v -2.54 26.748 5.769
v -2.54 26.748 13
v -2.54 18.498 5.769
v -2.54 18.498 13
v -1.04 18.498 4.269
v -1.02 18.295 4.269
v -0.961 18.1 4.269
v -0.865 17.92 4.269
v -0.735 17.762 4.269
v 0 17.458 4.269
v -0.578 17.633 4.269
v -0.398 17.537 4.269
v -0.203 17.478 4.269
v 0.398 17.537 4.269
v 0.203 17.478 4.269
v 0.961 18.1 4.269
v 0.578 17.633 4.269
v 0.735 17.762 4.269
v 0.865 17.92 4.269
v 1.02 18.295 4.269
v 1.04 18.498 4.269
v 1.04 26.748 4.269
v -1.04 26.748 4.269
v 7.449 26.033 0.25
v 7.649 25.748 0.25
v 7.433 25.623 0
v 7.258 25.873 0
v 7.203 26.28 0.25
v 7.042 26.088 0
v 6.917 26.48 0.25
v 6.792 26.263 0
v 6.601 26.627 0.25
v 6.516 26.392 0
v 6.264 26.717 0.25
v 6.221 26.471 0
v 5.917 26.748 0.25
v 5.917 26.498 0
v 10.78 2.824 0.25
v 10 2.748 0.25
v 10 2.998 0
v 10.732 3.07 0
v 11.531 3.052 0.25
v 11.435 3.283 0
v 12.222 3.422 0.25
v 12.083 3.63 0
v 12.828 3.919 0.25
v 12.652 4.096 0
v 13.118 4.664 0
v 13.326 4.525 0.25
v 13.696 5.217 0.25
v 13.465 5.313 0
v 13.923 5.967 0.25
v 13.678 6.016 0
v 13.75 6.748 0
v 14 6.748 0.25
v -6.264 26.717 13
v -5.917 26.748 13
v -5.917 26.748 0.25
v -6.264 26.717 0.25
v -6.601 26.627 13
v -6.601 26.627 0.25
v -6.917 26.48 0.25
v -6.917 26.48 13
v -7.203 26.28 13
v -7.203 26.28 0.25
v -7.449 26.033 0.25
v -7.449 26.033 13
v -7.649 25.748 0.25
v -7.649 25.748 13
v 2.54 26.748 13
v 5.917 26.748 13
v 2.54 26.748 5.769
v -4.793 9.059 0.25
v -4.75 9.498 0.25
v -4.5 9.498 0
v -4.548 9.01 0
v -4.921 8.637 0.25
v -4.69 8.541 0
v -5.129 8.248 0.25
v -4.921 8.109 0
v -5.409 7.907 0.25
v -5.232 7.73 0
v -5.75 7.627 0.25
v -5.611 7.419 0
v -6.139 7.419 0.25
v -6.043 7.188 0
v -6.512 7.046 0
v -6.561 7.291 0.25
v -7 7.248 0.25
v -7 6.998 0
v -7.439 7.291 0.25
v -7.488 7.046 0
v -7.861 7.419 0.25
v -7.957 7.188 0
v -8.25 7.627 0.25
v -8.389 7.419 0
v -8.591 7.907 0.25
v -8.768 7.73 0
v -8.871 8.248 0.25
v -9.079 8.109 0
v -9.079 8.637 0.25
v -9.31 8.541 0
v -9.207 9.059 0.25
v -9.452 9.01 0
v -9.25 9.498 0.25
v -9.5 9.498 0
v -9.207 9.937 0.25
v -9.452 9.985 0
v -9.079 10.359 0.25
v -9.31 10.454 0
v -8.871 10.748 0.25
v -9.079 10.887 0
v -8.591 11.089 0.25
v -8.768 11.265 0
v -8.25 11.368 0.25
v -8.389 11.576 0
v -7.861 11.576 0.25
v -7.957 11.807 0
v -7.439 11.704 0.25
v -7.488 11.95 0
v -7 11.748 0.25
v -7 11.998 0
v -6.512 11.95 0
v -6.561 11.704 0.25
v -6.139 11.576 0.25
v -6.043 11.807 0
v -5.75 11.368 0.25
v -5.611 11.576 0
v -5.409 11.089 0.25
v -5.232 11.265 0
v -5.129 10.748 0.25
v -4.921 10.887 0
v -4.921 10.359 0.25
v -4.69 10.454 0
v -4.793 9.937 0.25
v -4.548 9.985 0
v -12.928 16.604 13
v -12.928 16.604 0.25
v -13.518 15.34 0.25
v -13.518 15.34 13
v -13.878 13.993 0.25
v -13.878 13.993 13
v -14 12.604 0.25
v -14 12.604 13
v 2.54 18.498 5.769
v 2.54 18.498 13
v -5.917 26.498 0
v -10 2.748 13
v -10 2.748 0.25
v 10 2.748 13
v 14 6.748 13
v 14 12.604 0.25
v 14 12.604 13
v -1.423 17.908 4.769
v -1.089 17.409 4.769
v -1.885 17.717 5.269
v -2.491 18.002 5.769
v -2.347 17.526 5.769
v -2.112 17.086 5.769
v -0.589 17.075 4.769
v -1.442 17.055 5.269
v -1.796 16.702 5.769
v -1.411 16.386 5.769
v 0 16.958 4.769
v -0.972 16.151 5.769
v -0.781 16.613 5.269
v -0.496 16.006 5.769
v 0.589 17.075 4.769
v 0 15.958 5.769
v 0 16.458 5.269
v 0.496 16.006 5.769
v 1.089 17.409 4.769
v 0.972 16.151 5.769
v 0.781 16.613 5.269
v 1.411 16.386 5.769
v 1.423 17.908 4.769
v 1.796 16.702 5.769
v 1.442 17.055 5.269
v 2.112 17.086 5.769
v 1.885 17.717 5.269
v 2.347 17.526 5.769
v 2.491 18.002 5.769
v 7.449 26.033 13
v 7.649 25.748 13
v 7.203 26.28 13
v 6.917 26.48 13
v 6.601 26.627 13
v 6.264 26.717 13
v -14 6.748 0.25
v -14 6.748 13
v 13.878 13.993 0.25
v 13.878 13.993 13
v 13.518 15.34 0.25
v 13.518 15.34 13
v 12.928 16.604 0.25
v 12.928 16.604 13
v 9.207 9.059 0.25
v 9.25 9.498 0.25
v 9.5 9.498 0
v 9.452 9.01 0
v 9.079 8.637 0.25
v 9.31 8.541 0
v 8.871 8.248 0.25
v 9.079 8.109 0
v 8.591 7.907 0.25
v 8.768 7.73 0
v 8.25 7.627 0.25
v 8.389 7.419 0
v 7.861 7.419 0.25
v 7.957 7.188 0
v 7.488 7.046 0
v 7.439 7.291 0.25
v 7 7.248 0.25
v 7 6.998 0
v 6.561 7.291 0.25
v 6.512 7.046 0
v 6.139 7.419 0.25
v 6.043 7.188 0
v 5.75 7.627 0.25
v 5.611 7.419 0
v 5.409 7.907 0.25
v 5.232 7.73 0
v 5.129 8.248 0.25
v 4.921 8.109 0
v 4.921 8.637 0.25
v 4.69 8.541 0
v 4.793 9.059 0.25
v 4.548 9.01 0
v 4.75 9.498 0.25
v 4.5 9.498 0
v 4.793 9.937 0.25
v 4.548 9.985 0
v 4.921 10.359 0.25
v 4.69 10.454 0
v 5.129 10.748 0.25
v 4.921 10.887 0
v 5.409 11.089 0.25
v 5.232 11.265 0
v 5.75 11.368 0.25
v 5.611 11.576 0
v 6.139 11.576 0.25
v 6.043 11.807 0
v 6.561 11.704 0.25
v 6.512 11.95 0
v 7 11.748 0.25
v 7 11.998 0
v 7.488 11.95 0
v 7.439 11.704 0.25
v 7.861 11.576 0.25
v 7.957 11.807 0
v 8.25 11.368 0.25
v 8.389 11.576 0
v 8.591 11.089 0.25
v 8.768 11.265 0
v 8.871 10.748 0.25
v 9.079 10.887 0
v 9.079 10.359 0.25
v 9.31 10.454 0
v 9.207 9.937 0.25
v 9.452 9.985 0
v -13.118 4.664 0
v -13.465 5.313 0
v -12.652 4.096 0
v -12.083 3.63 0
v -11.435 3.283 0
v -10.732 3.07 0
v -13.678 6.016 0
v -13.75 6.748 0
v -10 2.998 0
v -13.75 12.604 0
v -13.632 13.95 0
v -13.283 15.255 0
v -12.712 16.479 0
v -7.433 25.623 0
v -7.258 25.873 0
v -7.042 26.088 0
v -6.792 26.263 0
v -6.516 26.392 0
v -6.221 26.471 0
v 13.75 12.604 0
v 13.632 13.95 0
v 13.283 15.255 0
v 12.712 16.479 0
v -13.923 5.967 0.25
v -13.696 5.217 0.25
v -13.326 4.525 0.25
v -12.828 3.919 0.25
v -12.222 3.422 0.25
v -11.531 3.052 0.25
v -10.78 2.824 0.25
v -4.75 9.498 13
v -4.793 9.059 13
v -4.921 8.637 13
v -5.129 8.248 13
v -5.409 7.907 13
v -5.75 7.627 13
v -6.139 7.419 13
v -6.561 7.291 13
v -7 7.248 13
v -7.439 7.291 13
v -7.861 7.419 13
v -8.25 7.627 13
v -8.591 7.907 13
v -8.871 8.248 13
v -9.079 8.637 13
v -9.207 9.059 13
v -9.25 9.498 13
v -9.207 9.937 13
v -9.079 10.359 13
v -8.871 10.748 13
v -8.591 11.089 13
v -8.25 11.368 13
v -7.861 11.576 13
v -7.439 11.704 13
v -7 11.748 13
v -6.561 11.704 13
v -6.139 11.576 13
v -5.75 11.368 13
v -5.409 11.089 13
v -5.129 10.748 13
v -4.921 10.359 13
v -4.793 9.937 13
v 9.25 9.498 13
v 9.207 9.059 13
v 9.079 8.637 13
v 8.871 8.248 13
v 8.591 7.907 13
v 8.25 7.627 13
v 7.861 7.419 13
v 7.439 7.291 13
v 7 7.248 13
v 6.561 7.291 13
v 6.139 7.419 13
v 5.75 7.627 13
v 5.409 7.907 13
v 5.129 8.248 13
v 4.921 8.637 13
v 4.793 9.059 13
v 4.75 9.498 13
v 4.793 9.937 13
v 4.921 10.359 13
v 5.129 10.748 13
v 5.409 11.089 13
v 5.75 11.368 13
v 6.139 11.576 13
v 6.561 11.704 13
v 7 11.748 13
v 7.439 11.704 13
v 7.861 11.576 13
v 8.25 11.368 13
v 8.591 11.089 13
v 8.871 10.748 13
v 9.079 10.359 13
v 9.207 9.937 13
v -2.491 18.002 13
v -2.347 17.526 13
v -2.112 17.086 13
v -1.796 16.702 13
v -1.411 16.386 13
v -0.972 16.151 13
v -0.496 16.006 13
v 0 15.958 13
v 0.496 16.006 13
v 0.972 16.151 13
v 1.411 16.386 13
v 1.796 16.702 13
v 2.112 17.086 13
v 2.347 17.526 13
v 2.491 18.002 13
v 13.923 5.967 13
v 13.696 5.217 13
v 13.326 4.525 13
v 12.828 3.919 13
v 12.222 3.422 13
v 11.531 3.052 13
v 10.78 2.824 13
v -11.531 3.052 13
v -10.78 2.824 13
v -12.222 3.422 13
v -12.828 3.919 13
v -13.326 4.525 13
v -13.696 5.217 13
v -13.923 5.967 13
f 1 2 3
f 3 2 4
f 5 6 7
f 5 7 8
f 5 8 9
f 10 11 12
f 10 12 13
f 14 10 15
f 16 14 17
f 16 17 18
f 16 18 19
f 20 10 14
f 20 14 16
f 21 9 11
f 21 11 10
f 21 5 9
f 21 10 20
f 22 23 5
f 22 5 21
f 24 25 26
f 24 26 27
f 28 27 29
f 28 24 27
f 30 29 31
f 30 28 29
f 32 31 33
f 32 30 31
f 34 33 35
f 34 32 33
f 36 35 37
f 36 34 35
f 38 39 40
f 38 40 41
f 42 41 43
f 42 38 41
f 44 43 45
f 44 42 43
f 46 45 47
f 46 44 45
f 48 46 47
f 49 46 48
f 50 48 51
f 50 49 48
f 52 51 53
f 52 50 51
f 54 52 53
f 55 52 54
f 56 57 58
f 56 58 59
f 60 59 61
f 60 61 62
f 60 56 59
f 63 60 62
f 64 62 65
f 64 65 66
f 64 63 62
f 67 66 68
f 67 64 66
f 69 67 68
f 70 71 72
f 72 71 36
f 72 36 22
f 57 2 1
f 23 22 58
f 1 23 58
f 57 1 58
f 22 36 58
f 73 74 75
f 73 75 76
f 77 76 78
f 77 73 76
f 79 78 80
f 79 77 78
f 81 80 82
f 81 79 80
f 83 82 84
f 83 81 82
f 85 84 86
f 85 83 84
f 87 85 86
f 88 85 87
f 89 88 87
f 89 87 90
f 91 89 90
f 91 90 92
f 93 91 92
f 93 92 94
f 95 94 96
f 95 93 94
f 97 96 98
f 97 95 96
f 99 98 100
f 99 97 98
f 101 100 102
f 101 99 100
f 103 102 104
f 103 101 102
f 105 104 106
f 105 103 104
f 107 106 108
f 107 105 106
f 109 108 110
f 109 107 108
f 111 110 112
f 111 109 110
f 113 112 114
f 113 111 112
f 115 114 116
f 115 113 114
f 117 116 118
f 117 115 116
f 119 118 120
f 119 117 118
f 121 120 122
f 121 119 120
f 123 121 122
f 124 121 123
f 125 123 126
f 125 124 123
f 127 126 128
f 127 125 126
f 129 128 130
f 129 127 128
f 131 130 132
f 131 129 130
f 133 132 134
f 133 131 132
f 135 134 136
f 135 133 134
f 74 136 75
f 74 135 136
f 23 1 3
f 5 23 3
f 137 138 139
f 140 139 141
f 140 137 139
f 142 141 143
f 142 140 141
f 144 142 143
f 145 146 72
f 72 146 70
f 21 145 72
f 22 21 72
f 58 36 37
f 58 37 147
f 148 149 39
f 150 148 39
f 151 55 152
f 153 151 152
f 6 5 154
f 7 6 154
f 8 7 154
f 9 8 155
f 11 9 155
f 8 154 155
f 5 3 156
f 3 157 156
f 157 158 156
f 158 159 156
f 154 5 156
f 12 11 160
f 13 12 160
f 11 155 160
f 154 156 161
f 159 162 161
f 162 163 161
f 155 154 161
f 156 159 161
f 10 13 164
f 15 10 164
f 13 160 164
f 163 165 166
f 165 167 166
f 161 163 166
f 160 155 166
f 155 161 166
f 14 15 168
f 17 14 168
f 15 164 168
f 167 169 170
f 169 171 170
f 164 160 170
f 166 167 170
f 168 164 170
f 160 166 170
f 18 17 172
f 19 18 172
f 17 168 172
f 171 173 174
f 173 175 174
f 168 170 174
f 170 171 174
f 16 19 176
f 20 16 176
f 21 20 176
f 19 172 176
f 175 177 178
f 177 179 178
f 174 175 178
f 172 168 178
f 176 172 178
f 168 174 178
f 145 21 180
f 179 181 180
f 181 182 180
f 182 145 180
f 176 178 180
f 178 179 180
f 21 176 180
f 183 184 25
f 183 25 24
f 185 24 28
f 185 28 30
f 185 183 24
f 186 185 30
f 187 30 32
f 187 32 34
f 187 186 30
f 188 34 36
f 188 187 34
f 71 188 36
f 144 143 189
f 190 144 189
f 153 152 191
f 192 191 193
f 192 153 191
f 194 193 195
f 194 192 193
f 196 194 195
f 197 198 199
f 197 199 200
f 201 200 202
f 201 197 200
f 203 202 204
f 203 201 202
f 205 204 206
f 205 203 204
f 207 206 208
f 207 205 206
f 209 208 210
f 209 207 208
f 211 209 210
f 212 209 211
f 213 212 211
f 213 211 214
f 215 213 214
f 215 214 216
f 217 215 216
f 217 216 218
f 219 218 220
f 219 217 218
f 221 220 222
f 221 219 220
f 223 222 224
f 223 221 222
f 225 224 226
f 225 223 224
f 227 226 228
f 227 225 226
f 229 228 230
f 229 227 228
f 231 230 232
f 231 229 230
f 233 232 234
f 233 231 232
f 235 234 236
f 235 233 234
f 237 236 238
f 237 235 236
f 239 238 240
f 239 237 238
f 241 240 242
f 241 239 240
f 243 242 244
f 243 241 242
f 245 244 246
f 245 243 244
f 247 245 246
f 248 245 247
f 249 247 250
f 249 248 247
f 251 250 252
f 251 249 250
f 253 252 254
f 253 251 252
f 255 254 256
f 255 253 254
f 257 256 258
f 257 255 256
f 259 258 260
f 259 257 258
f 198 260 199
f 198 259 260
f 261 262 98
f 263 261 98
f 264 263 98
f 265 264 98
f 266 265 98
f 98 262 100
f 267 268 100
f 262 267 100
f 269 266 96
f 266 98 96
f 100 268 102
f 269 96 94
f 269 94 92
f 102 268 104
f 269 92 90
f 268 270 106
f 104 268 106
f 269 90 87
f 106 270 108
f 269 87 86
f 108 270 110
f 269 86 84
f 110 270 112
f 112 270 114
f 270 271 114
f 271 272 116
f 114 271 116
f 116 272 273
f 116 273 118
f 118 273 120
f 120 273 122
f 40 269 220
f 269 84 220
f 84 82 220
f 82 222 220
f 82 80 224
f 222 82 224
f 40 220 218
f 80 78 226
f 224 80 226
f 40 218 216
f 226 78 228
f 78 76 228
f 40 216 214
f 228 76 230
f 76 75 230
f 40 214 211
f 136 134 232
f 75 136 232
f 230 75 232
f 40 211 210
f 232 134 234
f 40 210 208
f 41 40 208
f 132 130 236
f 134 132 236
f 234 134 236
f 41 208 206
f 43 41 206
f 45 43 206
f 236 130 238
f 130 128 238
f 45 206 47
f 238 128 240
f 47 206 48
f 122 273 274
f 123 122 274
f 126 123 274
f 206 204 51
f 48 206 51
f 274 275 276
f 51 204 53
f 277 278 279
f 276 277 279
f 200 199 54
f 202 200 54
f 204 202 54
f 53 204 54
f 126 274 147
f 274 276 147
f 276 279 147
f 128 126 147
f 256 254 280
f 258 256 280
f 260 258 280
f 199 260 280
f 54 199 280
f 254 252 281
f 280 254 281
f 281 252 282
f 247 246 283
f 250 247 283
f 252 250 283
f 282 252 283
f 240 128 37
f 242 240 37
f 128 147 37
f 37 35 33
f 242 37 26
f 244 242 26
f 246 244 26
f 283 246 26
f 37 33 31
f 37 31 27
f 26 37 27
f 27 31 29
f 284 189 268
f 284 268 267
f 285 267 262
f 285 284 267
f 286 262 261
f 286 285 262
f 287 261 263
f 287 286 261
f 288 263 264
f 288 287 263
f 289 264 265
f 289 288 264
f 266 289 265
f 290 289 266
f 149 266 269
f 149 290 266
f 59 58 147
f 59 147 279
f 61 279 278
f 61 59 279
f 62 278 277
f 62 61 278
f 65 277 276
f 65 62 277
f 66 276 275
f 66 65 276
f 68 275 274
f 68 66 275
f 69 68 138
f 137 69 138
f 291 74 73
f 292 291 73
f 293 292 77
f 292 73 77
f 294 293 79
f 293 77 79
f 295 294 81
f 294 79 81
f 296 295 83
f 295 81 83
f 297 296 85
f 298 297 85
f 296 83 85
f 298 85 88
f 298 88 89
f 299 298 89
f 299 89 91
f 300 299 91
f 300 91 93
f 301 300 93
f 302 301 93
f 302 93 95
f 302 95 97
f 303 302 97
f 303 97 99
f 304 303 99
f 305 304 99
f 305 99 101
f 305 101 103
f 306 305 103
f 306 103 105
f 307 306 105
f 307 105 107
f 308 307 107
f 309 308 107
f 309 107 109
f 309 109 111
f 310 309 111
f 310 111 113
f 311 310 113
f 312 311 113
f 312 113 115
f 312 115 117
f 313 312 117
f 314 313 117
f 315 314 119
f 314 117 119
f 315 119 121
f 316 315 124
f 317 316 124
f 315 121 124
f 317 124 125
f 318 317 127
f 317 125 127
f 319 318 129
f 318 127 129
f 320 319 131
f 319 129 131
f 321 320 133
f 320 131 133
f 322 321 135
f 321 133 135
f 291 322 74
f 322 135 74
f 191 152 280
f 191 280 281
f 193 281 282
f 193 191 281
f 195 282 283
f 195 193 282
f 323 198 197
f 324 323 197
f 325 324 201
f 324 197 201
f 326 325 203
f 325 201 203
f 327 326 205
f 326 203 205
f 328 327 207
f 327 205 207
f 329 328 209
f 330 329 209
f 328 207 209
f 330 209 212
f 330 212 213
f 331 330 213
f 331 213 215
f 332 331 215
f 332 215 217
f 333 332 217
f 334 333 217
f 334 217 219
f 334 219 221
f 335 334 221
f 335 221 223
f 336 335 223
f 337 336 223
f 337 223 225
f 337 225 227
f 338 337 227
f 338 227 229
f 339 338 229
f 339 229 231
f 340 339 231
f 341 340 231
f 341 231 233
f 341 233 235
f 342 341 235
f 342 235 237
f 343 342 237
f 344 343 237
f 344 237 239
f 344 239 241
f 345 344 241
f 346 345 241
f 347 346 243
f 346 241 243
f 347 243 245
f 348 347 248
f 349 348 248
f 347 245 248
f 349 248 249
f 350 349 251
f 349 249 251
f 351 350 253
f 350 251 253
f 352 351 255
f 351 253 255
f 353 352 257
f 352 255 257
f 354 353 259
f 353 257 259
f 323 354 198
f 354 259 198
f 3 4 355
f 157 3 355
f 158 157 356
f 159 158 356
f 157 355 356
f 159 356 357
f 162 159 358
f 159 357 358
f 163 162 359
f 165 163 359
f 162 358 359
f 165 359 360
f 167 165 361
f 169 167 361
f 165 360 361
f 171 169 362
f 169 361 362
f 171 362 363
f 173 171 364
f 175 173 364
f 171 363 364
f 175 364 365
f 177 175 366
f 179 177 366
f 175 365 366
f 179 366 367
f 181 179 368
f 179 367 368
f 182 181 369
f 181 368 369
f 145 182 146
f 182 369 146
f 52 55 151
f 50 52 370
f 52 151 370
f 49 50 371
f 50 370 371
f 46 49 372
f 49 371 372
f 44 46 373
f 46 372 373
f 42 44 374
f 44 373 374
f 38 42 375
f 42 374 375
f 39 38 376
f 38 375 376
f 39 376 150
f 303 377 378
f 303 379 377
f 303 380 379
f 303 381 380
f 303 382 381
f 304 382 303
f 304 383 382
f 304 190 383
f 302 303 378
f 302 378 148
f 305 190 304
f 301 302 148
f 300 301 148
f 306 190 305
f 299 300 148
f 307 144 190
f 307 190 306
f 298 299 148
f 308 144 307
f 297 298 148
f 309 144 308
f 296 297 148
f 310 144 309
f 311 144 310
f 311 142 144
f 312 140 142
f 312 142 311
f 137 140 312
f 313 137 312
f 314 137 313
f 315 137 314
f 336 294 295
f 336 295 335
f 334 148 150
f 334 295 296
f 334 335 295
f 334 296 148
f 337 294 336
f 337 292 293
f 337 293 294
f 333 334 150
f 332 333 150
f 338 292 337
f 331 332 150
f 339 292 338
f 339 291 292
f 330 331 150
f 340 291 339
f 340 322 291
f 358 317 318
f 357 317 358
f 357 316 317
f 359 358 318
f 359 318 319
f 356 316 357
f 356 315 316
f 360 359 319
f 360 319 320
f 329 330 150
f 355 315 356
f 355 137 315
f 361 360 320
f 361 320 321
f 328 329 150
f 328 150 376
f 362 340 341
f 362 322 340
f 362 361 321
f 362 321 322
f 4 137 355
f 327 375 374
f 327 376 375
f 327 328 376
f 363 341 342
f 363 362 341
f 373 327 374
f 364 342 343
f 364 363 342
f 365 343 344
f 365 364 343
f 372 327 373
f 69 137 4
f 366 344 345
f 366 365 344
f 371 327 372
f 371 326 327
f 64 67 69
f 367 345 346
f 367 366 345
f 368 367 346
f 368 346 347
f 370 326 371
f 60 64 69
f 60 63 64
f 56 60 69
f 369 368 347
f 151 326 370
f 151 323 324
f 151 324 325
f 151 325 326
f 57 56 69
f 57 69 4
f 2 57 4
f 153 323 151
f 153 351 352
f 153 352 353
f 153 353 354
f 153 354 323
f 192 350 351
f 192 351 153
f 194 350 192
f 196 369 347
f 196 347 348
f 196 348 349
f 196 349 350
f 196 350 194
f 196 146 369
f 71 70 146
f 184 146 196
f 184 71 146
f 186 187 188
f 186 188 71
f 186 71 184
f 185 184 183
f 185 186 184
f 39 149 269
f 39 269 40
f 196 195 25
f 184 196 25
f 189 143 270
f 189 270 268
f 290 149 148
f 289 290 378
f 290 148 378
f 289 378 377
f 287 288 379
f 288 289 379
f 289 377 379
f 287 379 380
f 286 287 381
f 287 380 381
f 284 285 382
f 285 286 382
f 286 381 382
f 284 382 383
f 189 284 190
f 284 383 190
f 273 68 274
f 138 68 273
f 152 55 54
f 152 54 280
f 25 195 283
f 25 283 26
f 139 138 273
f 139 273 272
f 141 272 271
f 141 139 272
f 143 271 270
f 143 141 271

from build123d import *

# Parameters (mm, degrees)
F1_DEPTH = 13
F2_R     = 8
F3_R     = 2
F5_DEPTH = 8.73125
F6_R     = 2.25
F7_DEPTH = 13.001
F8_R     = 4
F9_SIZE  = 1.5
F10_SIZE = 0.25


with BuildPart() as f1:
    # F0 (on Top) → F1 (new body)
    with BuildSketch(Plane.XY):
        Polygon((0, 2.747639), (14, 2.747639), (14, 14.747639), (7.071797, 26.747639), (0, 26.747639), (-7.071797, 26.747639), (-14, 14.747639), (-14, 2.747639), align=None)
    extrude(amount=F1_DEPTH)

    # F2
    f2_edges = [f1.edges().sort_by_distance(p)[0] for p in [
        (-14, 14.747639, 6.5),
        (14, 14.747639, 6.5),
    ]]
    fillet(f2_edges, radius=F2_R)

    # F3
    f3_edges = [f1.edges().sort_by_distance(p)[0] for p in [
        (-7.071797, 26.747639, 6.5),
        (7.071797, 26.747639, 6.5),
    ]]
    fillet(f3_edges, radius=F3_R)

    # F4 (on face) → F5 (cut)
    with BuildSketch(Plane.XY.offset(13)):
        with BuildLine():
            Line((-2.54, 26.747639), (-2.54, 18.497639))
            ThreePointArc((-2.54, 18.497639), (0, 15.957639), (2.54, 18.497639))
            Line((2.54, 18.497639), (2.54, 26.747639))
            Line((2.54, 26.747639), (-2.54, 26.747639))
        make_face()
    extrude(amount=-F5_DEPTH, mode=Mode.SUBTRACT)

    # F6 (on face) → F7 (cut, through all)
    with BuildSketch(Plane(origin=(0, 0, 0), x_dir=(1, 0, 0), z_dir=(0, 0, -1))):
        with Locations((-7, -9.497639)):
            Circle(F6_R)
        with Locations((7, -9.497639)):
            Circle(F6_R)
    extrude(amount=-F7_DEPTH, mode=Mode.SUBTRACT)

    # F8
    f8_edges = [f1.edges().sort_by_distance(p)[0] for p in [
        (-14, 2.747639, 6.5),
        (14, 2.747639, 6.5),
    ]]
    fillet(f8_edges, radius=F8_R)

    # F9
    f9_edges = [f1.edges().sort_by_distance(p)[0] for p in [
        (0, 15.957639, 4.26875),
    ]]
    chamfer(f9_edges, length=F9_SIZE)

    # F10
    f10_edges = [f1.edges().sort_by_distance(p)[0] for p in [
        (4.75, 9.497639, 0),
        (-9.25, 9.497639, 0),
        (10.288675, 21.175842, 0),
    ]]
    chamfer(f10_edges, length=F10_SIZE)


solid = f1.part
